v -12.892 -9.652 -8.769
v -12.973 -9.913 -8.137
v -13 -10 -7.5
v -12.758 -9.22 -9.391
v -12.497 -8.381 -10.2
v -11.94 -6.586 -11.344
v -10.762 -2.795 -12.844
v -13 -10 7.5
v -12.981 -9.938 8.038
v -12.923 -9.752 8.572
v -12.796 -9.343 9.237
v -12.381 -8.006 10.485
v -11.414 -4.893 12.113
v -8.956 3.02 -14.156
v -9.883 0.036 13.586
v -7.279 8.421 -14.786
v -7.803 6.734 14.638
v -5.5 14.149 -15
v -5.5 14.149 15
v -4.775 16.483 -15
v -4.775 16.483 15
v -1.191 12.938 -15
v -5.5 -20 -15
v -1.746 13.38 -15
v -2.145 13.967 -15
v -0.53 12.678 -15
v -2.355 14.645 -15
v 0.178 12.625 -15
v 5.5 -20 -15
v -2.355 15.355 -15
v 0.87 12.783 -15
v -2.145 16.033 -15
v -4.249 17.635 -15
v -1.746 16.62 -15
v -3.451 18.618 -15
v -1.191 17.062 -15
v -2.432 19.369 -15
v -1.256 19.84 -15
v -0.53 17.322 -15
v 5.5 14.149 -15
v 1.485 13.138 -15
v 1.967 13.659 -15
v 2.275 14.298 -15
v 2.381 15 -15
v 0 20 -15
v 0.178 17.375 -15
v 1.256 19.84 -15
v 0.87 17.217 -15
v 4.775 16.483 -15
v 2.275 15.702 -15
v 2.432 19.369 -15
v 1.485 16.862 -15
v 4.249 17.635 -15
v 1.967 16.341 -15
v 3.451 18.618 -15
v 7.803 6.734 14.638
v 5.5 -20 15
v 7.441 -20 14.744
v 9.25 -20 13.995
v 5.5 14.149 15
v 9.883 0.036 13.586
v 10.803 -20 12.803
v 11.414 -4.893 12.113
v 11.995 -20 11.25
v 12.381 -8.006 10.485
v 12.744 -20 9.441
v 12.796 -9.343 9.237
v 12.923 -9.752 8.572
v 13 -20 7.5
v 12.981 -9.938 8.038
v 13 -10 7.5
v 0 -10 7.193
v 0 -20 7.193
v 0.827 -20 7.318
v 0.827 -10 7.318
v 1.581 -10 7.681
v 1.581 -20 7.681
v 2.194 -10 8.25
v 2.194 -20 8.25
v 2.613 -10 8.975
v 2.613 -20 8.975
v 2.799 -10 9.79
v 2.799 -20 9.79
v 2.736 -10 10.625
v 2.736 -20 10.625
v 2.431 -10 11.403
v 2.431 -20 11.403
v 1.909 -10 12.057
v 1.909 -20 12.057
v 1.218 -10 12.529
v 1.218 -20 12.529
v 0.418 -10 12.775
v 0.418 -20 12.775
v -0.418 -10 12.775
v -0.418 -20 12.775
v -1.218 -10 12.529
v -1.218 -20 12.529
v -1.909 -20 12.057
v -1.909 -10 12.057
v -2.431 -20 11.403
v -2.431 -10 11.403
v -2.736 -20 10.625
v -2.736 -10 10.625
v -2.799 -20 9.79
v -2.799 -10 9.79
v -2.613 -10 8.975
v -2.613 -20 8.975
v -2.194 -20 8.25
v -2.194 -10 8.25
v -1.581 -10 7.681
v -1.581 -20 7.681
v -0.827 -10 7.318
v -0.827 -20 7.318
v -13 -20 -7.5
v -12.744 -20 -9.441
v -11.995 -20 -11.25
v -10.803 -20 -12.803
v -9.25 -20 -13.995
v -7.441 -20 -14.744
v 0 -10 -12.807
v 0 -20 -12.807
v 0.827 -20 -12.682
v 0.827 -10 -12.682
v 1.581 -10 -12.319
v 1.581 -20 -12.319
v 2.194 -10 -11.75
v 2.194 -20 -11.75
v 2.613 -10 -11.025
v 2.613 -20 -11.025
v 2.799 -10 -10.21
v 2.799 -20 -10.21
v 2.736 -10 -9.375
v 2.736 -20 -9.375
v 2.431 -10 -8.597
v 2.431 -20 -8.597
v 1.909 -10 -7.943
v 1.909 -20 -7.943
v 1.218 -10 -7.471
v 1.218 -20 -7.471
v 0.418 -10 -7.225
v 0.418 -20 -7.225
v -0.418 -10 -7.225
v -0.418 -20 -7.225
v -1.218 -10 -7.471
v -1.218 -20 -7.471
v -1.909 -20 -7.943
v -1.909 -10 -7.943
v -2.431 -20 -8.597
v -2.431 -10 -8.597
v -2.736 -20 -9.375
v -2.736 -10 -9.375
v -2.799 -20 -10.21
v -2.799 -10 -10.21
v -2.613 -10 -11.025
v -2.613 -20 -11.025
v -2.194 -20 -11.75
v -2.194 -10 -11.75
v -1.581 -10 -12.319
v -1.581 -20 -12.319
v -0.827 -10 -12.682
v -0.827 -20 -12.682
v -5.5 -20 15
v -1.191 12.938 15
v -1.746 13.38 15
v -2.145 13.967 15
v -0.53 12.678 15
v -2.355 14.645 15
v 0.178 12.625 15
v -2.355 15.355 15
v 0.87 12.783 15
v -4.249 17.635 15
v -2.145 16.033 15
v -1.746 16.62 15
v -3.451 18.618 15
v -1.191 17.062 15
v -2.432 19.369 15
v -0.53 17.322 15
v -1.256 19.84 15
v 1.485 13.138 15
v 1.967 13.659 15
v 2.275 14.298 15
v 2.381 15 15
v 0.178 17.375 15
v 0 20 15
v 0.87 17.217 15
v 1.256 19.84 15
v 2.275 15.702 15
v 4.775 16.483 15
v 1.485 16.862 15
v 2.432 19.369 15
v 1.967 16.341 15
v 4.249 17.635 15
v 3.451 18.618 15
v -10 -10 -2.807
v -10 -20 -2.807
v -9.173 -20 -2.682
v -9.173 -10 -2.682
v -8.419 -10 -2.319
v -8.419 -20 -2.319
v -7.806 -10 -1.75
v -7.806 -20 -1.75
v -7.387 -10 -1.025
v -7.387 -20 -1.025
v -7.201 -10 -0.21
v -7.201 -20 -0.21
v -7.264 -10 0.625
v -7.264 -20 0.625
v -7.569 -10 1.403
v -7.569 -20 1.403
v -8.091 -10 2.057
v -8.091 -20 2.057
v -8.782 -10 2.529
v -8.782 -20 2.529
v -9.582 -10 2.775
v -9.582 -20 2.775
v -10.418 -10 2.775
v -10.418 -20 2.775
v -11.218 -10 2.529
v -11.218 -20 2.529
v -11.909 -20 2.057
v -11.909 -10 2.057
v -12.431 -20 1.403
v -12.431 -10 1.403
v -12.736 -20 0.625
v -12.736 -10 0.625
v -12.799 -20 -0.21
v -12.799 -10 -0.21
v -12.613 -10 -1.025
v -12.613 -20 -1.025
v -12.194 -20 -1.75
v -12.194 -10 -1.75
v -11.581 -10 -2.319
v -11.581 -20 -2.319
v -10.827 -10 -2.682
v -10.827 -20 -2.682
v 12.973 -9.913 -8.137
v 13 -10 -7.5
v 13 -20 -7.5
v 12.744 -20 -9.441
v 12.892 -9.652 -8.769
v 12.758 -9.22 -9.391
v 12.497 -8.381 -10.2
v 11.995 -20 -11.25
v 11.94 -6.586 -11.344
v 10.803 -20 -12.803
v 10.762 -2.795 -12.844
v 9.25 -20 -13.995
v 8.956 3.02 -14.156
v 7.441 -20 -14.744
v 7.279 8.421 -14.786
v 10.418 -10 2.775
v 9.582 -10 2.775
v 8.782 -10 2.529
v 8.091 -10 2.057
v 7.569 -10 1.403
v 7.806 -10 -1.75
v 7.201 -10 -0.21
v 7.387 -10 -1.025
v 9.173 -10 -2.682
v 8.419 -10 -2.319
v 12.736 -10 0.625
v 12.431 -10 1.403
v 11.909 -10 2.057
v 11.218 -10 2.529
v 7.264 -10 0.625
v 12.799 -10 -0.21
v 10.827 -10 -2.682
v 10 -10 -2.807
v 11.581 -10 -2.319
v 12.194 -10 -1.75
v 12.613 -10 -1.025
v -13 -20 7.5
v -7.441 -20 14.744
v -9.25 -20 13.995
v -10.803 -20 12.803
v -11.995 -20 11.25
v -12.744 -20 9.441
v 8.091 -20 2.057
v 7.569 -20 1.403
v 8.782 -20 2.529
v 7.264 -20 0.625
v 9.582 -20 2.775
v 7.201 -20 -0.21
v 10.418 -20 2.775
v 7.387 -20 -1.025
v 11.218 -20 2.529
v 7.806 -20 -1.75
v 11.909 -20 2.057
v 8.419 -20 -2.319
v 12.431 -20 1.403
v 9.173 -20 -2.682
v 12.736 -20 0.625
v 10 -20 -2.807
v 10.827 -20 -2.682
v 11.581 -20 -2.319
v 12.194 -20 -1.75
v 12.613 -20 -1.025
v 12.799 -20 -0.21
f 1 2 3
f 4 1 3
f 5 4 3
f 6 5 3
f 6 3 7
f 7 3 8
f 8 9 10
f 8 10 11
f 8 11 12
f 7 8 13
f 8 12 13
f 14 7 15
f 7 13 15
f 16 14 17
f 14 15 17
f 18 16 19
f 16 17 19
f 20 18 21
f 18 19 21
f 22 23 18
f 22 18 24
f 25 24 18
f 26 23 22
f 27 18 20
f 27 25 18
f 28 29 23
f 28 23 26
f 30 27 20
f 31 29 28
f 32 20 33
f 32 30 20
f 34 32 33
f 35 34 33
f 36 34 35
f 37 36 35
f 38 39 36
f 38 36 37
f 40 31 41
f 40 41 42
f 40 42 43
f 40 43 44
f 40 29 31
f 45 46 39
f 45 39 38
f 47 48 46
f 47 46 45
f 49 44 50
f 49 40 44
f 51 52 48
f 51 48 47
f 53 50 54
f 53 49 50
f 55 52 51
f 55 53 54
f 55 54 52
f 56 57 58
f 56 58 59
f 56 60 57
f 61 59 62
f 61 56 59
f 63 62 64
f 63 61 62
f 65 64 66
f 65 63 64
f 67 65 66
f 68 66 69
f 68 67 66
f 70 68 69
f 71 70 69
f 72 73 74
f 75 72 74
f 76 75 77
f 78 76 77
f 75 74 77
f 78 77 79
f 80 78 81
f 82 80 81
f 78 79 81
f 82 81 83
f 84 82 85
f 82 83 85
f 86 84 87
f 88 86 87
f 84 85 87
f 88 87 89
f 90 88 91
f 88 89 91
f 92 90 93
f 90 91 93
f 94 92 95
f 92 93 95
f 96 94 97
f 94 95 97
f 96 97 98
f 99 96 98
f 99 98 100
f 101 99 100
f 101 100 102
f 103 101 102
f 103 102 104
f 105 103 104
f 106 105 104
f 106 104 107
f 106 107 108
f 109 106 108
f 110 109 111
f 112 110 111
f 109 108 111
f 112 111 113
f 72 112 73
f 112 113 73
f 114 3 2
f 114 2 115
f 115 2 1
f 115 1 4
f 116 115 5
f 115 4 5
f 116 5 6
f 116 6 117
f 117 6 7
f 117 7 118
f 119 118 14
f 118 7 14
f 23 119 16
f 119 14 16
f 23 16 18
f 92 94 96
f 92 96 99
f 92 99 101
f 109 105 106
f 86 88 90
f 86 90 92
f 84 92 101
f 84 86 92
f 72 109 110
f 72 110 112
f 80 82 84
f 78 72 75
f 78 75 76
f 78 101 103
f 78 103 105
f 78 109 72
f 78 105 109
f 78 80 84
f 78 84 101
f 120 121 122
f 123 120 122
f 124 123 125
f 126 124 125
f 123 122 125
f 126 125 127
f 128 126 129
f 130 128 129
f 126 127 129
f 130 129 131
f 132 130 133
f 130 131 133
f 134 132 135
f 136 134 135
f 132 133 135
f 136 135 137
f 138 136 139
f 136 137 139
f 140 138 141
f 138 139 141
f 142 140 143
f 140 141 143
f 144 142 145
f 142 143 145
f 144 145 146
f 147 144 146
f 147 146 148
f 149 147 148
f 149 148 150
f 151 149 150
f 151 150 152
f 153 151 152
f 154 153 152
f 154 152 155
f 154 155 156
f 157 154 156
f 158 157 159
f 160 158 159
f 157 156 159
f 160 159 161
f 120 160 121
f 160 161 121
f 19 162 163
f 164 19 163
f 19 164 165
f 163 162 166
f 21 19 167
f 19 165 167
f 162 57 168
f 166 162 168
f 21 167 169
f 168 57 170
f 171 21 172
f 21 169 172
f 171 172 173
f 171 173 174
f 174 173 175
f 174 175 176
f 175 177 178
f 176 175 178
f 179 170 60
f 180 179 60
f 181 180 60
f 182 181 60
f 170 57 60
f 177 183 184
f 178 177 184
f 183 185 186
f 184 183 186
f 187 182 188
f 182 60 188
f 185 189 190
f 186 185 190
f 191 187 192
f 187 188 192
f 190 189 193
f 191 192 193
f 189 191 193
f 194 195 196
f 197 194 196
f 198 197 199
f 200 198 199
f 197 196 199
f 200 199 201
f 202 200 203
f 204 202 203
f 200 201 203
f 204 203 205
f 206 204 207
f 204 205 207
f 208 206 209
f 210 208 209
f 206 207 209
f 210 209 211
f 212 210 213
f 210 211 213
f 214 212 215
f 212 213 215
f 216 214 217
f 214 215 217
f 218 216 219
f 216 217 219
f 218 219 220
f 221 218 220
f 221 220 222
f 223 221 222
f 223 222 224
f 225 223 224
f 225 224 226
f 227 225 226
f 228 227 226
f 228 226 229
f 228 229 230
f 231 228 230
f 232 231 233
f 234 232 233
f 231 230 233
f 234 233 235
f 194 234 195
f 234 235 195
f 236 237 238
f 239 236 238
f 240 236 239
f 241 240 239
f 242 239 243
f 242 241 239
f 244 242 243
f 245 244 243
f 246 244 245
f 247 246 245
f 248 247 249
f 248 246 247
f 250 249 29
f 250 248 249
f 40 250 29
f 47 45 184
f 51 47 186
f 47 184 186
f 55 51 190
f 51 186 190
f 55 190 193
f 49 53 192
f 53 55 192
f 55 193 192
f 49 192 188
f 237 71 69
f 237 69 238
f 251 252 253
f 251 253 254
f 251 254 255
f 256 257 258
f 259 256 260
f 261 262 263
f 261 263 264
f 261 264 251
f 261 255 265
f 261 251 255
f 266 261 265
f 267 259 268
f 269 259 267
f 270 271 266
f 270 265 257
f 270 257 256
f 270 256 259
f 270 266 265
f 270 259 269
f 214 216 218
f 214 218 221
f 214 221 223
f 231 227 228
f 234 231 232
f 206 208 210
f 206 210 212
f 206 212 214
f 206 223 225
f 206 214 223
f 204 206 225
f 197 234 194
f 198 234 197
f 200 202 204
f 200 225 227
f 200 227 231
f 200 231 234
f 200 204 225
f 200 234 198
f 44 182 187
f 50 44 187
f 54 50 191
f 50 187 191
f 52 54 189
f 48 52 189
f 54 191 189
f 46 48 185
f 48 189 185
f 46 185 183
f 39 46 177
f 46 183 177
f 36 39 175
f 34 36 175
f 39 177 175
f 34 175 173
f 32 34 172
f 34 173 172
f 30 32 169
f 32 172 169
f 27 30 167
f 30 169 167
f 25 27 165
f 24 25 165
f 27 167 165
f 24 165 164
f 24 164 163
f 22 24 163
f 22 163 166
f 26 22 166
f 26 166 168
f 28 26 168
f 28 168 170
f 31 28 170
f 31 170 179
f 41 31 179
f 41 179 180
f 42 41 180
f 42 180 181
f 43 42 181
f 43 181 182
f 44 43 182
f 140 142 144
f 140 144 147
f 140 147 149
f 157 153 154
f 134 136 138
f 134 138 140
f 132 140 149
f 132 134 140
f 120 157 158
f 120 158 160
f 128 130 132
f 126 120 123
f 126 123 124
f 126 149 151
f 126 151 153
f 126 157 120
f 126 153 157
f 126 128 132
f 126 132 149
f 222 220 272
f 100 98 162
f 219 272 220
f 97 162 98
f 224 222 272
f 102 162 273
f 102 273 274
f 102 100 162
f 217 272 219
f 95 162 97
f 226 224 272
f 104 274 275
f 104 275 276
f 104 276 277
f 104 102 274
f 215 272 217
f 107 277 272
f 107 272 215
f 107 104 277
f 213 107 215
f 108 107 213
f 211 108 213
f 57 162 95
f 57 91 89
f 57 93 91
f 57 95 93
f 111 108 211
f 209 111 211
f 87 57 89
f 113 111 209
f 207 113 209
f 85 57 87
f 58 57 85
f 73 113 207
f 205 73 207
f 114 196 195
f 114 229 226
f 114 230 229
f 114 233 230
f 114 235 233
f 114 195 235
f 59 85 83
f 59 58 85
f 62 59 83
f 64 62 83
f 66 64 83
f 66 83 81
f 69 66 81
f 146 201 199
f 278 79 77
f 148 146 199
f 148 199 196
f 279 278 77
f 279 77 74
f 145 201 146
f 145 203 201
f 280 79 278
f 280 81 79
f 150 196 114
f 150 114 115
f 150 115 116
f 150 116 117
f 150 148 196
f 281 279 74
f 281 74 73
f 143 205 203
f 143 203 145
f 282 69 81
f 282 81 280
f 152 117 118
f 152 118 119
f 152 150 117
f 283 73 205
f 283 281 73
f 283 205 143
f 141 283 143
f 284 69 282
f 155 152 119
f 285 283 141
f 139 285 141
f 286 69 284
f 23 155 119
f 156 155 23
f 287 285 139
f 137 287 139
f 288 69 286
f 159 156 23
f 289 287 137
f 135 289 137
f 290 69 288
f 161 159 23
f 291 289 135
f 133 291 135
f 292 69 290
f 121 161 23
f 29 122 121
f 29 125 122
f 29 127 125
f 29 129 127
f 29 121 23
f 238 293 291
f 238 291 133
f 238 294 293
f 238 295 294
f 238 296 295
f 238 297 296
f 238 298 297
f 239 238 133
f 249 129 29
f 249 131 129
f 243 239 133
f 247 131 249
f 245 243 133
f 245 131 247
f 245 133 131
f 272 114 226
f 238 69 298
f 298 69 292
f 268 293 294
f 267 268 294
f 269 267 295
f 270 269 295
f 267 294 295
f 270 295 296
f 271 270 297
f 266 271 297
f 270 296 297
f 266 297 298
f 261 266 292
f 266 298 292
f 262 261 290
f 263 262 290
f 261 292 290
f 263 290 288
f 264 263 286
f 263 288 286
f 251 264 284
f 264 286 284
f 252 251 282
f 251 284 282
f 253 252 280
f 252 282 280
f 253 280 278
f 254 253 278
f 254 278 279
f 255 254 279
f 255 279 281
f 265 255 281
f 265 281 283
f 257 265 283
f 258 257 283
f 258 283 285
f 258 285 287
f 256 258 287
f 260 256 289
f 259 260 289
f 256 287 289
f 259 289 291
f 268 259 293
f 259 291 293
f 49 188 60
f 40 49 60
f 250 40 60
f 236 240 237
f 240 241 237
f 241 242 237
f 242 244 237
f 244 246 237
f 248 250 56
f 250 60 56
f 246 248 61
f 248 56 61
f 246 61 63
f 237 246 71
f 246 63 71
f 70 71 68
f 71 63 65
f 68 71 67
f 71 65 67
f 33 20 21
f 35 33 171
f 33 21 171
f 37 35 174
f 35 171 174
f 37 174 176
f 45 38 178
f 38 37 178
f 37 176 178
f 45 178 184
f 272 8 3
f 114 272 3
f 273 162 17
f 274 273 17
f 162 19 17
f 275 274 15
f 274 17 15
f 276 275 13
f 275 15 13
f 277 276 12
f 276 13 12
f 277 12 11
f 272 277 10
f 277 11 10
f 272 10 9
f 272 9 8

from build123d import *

# Parameters (mm, degrees)
SKETCH1_W           = 30
SKETCH1_H           = 40
BOSS_EXTRUDE1_DEPTH = 13
SKETCH2_R           = 2.38125
CUT_EXTRUDE1_DEPTH  = 39.327535793
SKETCH3_R           = 2.8067
CUT_EXTRUDE2_DEPTH  = 10
FILLET1_R           = 7.5


with BuildPart() as part:
    # Sketch1 → Boss-Extrude1 (new, symmetric)
    with BuildSketch(Plane(origin=(0, 0, 0), x_dir=(0, 0, -1), z_dir=(1, 0, 0))):
        Rectangle(SKETCH1_W, SKETCH1_H)
    extrude(amount=BOSS_EXTRUDE1_DEPTH, both=True)

    # Sketch2 → Cut-Extrude1 (cut, through all)
    with BuildSketch(Plane.XY.offset(15)):
        with BuildLine():
            Line((-13, 20), (-13, -10))
            Line((-13, -10), (-4.775007753, 16.483004032))
            ThreePointArc((-4.775007753, 16.483004032), (-2.965213301, 19.025855198), (0, 20))
            Line((0, 20), (-13, 20))
        make_face()
        with Locations((0, 15)):
            Circle(SKETCH2_R)
        with BuildLine():
            Line((13, 20), (0, 20))
            ThreePointArc((0, 20), (2.965213301, 19.025855198), (4.775007753, 16.483004032))
            Line((4.775007753, 16.483004032), (13, -10))
            Line((13, -10), (13, 20))
        make_face()
    extrude(amount=-CUT_EXTRUDE1_DEPTH, mode=Mode.SUBTRACT)

    # Sketch3 → Cut-Extrude2 (cut)
    with BuildSketch(Plane.XZ.offset(20)):
        with Locations(Location((0, 10, 0), (0, 0, 270))):
            Circle(SKETCH3_R)
        with Locations(Location((0, -10, 0), (0, 0, 270))):
            Circle(SKETCH3_R)
        with Locations(Location((-10, 0, 0), (0, 0, 270))):
            Circle(SKETCH3_R)
        with Locations(Location((10, 0, 0), (0, 0, 270))):
            Circle(SKETCH3_R)
    extrude(amount=-CUT_EXTRUDE2_DEPTH, mode=Mode.SUBTRACT)

    # Fillet1
    fillet1_edges = [part.edges().sort_by_distance(p)[0] for p in [
        (-13, -15, 15),
        (13, -15, 15),
        (13, -15, -15),
        (-13, -15, -15),
    ]]
    fillet(fillet1_edges, radius=FILLET1_R)


solid = part.part
